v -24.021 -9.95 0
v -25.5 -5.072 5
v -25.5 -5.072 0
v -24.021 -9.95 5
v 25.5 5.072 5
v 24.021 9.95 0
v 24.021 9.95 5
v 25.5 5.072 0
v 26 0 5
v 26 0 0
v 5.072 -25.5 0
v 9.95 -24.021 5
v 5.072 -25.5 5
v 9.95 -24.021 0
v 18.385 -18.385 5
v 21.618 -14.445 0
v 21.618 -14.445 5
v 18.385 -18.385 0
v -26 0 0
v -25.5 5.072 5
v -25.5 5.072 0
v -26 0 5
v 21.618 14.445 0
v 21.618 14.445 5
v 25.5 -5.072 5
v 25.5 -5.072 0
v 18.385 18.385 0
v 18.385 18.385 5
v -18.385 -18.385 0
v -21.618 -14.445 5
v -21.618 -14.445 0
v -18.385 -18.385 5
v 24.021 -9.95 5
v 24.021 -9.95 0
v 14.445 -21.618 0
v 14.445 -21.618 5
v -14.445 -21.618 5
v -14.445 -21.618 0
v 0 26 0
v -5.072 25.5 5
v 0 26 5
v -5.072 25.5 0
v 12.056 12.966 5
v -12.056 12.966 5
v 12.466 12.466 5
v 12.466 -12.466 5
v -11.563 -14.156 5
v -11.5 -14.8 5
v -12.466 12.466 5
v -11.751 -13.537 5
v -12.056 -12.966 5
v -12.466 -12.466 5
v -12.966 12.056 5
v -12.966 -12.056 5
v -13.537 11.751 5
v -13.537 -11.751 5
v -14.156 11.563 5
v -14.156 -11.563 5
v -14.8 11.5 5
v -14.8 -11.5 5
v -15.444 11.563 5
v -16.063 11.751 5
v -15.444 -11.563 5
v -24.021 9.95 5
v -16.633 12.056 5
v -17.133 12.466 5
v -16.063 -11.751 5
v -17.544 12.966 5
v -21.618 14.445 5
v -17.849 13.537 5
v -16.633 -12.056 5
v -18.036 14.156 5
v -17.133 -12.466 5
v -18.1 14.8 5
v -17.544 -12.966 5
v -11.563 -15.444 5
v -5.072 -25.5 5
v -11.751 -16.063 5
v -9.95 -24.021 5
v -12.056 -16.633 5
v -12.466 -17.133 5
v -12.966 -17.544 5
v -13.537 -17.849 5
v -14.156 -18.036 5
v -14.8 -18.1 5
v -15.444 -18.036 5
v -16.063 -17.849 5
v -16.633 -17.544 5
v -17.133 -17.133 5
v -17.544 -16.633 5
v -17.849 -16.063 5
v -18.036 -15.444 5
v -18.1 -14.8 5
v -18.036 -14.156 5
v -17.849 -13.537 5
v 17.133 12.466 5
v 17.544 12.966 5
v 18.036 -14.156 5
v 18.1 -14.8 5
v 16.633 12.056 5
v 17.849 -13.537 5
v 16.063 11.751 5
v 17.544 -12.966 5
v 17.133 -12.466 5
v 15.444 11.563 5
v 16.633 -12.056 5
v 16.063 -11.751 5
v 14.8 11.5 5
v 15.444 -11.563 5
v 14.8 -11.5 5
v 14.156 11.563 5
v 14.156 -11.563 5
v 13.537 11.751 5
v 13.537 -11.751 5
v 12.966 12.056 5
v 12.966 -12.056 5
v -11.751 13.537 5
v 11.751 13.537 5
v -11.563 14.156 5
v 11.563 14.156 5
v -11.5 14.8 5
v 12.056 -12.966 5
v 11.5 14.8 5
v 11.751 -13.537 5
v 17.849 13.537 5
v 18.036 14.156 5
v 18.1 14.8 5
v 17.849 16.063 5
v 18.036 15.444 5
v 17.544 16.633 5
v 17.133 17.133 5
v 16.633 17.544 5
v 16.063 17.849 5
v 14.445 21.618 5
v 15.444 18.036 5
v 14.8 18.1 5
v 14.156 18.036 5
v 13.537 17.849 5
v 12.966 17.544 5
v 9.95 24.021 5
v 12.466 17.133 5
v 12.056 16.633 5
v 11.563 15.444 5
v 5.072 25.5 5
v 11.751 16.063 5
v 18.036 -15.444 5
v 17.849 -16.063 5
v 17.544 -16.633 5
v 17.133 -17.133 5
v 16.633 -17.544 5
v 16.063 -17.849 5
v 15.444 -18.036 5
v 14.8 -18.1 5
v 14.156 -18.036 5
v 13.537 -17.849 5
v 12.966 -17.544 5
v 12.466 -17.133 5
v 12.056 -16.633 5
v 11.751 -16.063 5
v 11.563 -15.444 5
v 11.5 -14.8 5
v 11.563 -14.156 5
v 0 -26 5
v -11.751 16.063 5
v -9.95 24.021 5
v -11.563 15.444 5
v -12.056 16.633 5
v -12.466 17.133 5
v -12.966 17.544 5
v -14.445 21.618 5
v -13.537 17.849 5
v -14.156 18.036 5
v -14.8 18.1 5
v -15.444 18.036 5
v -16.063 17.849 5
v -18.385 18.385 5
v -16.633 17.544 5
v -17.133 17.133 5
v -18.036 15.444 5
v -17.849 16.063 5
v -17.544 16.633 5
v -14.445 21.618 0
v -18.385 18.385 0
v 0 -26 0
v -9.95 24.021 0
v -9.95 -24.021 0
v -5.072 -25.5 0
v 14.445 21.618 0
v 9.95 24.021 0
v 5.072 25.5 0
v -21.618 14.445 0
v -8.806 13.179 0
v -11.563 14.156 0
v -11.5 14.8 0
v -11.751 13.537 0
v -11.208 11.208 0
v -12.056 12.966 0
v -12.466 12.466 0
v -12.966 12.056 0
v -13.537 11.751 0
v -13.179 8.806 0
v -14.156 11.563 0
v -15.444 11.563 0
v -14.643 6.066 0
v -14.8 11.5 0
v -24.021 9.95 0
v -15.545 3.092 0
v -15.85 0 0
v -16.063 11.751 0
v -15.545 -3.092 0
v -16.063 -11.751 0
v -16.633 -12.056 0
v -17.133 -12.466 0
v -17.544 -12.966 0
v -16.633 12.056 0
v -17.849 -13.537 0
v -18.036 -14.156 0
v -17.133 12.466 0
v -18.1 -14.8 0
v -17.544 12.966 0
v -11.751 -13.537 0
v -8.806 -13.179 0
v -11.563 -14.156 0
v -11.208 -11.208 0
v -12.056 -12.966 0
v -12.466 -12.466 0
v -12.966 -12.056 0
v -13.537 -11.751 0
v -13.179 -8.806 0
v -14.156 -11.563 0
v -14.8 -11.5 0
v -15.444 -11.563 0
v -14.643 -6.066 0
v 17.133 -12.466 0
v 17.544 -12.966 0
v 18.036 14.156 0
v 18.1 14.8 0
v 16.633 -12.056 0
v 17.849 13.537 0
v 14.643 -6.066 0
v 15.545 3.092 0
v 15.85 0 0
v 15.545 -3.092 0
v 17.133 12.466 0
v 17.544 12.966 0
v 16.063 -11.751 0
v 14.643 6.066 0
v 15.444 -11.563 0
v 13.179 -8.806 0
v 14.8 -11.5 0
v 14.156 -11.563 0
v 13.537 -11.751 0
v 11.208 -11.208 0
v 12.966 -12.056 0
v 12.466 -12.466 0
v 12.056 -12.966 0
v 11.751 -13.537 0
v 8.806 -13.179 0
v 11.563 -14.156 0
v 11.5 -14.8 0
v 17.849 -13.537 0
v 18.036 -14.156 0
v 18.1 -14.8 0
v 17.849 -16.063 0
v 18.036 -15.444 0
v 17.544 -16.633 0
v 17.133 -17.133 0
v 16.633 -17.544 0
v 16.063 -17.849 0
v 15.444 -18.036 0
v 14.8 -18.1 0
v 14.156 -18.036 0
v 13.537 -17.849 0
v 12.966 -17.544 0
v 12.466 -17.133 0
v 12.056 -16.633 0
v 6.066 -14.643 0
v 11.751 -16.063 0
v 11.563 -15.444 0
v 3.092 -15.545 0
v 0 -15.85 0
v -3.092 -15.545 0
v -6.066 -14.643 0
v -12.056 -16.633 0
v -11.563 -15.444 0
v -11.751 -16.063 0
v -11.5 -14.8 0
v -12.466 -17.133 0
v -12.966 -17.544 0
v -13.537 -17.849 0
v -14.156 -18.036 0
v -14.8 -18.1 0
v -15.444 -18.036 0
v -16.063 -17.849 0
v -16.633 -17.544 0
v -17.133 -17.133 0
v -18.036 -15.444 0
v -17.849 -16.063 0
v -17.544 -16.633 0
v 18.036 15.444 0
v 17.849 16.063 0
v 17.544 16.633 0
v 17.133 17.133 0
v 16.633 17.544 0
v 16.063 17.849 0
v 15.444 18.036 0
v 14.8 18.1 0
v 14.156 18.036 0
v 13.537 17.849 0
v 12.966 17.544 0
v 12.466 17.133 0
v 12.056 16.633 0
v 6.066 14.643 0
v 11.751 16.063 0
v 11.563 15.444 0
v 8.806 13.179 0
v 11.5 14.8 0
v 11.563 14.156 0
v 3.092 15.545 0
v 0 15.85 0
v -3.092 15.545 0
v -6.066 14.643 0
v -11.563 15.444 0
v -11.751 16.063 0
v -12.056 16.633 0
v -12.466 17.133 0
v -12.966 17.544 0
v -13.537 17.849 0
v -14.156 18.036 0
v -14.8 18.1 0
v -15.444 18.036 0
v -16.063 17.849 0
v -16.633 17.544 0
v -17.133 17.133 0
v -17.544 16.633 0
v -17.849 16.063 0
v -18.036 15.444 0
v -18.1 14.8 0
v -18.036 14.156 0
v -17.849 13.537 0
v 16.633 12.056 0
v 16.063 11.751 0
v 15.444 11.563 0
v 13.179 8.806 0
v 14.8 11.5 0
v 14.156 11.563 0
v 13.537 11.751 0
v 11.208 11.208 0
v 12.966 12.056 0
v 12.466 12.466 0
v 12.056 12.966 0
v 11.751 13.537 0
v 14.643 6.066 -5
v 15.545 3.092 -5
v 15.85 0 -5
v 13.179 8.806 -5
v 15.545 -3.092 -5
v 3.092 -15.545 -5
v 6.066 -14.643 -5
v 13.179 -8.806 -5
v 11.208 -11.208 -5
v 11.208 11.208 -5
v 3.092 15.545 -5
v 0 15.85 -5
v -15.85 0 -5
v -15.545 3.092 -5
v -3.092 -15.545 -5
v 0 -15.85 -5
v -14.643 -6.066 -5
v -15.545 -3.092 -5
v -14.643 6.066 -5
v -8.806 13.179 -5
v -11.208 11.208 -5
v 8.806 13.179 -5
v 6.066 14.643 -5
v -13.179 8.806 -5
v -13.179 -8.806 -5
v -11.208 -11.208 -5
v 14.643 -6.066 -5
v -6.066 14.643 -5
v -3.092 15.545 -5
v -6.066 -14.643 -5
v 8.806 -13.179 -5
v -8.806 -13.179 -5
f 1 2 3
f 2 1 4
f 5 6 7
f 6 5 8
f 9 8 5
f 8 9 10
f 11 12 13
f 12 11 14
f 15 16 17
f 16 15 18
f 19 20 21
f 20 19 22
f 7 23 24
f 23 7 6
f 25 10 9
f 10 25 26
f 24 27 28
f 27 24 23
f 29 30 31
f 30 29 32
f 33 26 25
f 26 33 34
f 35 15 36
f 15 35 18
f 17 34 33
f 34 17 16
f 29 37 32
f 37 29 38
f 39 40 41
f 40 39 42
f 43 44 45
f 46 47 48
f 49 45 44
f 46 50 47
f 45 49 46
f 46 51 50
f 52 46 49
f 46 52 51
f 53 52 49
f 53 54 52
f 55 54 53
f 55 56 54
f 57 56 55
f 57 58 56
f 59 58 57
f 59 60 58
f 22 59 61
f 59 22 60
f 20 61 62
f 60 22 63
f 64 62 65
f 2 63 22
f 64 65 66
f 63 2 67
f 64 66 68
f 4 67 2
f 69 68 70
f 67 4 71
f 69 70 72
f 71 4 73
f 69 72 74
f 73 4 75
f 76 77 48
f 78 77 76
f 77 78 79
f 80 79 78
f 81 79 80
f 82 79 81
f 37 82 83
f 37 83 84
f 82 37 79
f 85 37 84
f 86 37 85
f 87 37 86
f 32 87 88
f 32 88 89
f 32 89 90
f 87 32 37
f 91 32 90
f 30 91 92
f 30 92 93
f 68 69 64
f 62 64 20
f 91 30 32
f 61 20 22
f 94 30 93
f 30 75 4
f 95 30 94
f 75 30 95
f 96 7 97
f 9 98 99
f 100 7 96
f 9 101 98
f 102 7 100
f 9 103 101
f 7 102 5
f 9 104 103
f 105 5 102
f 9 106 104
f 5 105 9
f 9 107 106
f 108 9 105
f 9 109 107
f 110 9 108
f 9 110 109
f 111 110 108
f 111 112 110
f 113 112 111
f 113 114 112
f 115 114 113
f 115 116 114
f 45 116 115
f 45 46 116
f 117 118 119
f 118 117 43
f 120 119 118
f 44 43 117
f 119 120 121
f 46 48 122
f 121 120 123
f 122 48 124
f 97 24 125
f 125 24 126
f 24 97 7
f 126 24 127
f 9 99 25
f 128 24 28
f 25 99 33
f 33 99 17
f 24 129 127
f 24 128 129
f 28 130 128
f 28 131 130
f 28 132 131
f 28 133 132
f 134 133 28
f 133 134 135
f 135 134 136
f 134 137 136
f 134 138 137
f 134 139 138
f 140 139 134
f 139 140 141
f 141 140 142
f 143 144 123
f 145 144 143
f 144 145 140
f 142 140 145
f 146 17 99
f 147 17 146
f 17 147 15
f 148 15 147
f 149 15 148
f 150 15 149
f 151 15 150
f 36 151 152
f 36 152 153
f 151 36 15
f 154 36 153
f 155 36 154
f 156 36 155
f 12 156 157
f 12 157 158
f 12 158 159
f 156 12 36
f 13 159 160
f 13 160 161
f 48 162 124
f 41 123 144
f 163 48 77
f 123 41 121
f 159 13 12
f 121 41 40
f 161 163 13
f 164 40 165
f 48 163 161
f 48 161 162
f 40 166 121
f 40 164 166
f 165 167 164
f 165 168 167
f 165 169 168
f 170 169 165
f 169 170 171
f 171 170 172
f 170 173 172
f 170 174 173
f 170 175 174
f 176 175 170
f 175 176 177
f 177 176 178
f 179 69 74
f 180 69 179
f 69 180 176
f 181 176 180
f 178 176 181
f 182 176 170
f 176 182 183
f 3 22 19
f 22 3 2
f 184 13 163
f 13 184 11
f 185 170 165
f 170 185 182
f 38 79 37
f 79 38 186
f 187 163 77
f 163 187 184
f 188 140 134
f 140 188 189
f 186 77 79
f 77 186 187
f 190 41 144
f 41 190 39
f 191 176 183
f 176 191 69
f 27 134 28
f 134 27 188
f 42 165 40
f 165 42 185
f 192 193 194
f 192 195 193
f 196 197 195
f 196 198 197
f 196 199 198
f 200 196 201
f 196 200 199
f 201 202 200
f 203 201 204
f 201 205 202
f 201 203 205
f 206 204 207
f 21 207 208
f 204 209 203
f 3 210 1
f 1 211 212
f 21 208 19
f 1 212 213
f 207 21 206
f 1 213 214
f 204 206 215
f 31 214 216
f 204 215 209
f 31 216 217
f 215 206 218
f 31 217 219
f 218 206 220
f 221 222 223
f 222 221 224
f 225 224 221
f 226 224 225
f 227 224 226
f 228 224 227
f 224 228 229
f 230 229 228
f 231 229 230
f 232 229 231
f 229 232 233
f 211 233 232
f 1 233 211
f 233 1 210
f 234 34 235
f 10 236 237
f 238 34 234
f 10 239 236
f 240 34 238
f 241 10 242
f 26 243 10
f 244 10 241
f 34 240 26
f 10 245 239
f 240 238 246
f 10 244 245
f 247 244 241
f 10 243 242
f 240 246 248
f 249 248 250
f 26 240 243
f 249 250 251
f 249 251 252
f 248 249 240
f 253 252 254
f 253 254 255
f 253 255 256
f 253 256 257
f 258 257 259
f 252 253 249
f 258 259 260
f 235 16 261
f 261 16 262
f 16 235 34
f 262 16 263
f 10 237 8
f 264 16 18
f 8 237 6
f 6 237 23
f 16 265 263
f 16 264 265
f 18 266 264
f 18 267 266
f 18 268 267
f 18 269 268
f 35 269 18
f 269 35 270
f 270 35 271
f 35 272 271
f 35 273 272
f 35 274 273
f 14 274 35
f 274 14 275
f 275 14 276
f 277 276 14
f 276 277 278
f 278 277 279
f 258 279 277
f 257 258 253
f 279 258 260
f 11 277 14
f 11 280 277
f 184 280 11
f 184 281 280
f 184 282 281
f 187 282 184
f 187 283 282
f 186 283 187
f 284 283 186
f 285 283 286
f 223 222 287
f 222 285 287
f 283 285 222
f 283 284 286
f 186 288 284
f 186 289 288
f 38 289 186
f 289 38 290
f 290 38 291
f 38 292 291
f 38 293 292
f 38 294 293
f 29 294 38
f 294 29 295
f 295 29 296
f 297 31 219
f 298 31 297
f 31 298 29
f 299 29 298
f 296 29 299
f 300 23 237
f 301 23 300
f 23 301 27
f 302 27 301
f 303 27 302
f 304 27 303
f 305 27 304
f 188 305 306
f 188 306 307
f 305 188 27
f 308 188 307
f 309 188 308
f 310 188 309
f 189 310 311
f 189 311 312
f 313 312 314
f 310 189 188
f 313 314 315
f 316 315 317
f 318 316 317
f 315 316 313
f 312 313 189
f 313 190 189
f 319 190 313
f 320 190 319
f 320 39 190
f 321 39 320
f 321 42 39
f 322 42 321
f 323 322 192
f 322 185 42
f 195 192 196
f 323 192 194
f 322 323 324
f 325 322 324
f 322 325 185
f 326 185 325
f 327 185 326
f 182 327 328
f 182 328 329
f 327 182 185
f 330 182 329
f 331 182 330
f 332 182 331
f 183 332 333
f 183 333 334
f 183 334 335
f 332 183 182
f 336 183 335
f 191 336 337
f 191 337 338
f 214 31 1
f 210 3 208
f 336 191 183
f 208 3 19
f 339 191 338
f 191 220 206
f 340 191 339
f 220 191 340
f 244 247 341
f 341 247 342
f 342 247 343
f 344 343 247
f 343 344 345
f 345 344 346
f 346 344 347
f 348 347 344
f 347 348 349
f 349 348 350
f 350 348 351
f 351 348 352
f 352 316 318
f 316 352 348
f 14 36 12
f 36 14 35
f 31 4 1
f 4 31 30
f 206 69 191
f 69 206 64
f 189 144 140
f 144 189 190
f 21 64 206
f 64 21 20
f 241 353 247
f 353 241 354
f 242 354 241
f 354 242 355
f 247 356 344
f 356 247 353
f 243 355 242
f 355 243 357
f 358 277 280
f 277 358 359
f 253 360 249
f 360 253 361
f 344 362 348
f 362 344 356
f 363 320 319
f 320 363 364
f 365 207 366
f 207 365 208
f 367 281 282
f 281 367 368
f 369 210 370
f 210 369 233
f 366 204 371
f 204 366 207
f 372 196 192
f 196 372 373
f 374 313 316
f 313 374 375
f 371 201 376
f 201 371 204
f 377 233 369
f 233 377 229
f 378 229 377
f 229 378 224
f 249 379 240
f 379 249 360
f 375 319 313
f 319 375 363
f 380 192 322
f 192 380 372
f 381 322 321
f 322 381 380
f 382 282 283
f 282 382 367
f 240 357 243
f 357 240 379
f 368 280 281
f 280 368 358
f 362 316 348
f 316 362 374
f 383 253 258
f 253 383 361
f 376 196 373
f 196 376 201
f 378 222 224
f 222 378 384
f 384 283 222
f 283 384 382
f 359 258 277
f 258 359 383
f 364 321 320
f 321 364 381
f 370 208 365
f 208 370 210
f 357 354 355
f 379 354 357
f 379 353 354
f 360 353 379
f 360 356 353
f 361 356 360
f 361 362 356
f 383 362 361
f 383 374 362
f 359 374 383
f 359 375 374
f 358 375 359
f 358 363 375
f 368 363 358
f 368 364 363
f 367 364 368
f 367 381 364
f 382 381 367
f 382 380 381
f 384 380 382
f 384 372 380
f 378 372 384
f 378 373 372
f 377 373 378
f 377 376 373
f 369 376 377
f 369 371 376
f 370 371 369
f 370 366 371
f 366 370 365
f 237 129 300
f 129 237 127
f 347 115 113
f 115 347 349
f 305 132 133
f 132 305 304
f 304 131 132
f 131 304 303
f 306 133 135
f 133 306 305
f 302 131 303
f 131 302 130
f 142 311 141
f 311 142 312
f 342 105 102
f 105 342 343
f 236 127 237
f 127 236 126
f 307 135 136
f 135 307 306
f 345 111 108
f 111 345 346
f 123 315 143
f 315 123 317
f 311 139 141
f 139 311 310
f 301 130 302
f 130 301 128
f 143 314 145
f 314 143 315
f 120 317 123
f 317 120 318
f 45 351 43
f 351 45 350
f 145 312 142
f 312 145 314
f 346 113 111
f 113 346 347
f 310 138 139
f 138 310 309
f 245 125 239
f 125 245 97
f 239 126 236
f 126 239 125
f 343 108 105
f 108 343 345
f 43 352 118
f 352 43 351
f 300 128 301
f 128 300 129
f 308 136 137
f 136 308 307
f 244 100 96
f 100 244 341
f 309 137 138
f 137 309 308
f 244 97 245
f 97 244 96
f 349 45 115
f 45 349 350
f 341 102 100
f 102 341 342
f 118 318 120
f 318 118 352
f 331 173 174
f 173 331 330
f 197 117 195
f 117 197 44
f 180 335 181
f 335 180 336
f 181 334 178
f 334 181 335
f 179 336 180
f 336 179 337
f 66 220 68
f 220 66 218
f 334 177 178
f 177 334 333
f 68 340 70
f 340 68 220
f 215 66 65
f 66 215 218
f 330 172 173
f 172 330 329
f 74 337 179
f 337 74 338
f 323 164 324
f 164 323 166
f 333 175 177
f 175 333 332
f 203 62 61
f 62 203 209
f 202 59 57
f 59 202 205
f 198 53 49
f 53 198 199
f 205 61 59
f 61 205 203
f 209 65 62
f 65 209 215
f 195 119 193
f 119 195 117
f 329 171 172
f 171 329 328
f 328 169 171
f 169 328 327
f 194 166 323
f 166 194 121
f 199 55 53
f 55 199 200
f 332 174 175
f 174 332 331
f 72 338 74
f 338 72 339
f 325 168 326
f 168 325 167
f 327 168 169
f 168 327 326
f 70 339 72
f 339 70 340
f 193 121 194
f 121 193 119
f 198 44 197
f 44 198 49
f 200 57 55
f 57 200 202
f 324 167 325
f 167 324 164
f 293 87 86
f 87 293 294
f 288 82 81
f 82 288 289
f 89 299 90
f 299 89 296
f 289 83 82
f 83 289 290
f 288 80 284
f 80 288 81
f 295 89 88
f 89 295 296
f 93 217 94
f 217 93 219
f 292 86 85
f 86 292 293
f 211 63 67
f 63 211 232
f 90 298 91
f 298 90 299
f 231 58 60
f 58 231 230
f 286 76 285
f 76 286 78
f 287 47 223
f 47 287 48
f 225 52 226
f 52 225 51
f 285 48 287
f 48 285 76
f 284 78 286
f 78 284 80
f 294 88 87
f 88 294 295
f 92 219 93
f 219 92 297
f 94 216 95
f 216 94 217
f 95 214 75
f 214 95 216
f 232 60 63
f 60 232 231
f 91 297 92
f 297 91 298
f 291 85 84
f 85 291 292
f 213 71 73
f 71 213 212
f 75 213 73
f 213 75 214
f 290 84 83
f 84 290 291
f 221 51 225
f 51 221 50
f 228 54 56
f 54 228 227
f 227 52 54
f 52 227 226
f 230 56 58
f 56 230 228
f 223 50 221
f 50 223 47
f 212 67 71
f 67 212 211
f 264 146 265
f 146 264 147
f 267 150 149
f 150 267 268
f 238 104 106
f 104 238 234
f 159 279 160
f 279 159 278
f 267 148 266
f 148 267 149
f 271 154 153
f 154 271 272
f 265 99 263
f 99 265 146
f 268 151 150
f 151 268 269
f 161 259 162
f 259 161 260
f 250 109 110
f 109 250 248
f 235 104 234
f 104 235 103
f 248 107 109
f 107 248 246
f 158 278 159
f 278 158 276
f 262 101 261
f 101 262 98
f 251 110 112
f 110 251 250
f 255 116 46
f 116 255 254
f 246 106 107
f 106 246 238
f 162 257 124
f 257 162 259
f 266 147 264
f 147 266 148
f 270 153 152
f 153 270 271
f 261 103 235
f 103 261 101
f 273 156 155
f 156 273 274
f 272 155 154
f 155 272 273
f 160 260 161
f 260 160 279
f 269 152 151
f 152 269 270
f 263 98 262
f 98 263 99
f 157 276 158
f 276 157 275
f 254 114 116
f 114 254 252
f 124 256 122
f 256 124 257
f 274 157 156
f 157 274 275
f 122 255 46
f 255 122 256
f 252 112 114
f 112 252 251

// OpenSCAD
$fn = 32;

// ----------------------------------------------------------------------
// Retaining cap: 6002 cover, 52 mm, spigot 31.7 mm
// ----------------------------------------------------------------------

// --- parameters (mm) ---
cap_d = 52;               // cover diameter
cap_t = 5;                // cover thickness
lip_d = 31.7;             // spigot that enters the housing
lip_h = 5;                // spigot height
bolt_d = 6.6;             // bolt clearance
bolt_r = 20.93;           // bolt circle radius

module cover() {
  cylinder(h = cap_t, d = cap_d);
}

module spigot() {
  /* sunk 1 mm into the cover; the spigot sets the overall height */
  translate([0, 0, -lip_h]) cylinder(h = lip_h + 1, d = lip_d);
}

difference() {
  union() {
    cover();
    spigot();
  }
  for (i = [0 : 3]) rotate([0, 0, 45 + i * 90]) translate([bolt_r, 0, -lip_h - 1])
    cylinder(h = lip_h + cap_t + 2, d = bolt_d);
}
